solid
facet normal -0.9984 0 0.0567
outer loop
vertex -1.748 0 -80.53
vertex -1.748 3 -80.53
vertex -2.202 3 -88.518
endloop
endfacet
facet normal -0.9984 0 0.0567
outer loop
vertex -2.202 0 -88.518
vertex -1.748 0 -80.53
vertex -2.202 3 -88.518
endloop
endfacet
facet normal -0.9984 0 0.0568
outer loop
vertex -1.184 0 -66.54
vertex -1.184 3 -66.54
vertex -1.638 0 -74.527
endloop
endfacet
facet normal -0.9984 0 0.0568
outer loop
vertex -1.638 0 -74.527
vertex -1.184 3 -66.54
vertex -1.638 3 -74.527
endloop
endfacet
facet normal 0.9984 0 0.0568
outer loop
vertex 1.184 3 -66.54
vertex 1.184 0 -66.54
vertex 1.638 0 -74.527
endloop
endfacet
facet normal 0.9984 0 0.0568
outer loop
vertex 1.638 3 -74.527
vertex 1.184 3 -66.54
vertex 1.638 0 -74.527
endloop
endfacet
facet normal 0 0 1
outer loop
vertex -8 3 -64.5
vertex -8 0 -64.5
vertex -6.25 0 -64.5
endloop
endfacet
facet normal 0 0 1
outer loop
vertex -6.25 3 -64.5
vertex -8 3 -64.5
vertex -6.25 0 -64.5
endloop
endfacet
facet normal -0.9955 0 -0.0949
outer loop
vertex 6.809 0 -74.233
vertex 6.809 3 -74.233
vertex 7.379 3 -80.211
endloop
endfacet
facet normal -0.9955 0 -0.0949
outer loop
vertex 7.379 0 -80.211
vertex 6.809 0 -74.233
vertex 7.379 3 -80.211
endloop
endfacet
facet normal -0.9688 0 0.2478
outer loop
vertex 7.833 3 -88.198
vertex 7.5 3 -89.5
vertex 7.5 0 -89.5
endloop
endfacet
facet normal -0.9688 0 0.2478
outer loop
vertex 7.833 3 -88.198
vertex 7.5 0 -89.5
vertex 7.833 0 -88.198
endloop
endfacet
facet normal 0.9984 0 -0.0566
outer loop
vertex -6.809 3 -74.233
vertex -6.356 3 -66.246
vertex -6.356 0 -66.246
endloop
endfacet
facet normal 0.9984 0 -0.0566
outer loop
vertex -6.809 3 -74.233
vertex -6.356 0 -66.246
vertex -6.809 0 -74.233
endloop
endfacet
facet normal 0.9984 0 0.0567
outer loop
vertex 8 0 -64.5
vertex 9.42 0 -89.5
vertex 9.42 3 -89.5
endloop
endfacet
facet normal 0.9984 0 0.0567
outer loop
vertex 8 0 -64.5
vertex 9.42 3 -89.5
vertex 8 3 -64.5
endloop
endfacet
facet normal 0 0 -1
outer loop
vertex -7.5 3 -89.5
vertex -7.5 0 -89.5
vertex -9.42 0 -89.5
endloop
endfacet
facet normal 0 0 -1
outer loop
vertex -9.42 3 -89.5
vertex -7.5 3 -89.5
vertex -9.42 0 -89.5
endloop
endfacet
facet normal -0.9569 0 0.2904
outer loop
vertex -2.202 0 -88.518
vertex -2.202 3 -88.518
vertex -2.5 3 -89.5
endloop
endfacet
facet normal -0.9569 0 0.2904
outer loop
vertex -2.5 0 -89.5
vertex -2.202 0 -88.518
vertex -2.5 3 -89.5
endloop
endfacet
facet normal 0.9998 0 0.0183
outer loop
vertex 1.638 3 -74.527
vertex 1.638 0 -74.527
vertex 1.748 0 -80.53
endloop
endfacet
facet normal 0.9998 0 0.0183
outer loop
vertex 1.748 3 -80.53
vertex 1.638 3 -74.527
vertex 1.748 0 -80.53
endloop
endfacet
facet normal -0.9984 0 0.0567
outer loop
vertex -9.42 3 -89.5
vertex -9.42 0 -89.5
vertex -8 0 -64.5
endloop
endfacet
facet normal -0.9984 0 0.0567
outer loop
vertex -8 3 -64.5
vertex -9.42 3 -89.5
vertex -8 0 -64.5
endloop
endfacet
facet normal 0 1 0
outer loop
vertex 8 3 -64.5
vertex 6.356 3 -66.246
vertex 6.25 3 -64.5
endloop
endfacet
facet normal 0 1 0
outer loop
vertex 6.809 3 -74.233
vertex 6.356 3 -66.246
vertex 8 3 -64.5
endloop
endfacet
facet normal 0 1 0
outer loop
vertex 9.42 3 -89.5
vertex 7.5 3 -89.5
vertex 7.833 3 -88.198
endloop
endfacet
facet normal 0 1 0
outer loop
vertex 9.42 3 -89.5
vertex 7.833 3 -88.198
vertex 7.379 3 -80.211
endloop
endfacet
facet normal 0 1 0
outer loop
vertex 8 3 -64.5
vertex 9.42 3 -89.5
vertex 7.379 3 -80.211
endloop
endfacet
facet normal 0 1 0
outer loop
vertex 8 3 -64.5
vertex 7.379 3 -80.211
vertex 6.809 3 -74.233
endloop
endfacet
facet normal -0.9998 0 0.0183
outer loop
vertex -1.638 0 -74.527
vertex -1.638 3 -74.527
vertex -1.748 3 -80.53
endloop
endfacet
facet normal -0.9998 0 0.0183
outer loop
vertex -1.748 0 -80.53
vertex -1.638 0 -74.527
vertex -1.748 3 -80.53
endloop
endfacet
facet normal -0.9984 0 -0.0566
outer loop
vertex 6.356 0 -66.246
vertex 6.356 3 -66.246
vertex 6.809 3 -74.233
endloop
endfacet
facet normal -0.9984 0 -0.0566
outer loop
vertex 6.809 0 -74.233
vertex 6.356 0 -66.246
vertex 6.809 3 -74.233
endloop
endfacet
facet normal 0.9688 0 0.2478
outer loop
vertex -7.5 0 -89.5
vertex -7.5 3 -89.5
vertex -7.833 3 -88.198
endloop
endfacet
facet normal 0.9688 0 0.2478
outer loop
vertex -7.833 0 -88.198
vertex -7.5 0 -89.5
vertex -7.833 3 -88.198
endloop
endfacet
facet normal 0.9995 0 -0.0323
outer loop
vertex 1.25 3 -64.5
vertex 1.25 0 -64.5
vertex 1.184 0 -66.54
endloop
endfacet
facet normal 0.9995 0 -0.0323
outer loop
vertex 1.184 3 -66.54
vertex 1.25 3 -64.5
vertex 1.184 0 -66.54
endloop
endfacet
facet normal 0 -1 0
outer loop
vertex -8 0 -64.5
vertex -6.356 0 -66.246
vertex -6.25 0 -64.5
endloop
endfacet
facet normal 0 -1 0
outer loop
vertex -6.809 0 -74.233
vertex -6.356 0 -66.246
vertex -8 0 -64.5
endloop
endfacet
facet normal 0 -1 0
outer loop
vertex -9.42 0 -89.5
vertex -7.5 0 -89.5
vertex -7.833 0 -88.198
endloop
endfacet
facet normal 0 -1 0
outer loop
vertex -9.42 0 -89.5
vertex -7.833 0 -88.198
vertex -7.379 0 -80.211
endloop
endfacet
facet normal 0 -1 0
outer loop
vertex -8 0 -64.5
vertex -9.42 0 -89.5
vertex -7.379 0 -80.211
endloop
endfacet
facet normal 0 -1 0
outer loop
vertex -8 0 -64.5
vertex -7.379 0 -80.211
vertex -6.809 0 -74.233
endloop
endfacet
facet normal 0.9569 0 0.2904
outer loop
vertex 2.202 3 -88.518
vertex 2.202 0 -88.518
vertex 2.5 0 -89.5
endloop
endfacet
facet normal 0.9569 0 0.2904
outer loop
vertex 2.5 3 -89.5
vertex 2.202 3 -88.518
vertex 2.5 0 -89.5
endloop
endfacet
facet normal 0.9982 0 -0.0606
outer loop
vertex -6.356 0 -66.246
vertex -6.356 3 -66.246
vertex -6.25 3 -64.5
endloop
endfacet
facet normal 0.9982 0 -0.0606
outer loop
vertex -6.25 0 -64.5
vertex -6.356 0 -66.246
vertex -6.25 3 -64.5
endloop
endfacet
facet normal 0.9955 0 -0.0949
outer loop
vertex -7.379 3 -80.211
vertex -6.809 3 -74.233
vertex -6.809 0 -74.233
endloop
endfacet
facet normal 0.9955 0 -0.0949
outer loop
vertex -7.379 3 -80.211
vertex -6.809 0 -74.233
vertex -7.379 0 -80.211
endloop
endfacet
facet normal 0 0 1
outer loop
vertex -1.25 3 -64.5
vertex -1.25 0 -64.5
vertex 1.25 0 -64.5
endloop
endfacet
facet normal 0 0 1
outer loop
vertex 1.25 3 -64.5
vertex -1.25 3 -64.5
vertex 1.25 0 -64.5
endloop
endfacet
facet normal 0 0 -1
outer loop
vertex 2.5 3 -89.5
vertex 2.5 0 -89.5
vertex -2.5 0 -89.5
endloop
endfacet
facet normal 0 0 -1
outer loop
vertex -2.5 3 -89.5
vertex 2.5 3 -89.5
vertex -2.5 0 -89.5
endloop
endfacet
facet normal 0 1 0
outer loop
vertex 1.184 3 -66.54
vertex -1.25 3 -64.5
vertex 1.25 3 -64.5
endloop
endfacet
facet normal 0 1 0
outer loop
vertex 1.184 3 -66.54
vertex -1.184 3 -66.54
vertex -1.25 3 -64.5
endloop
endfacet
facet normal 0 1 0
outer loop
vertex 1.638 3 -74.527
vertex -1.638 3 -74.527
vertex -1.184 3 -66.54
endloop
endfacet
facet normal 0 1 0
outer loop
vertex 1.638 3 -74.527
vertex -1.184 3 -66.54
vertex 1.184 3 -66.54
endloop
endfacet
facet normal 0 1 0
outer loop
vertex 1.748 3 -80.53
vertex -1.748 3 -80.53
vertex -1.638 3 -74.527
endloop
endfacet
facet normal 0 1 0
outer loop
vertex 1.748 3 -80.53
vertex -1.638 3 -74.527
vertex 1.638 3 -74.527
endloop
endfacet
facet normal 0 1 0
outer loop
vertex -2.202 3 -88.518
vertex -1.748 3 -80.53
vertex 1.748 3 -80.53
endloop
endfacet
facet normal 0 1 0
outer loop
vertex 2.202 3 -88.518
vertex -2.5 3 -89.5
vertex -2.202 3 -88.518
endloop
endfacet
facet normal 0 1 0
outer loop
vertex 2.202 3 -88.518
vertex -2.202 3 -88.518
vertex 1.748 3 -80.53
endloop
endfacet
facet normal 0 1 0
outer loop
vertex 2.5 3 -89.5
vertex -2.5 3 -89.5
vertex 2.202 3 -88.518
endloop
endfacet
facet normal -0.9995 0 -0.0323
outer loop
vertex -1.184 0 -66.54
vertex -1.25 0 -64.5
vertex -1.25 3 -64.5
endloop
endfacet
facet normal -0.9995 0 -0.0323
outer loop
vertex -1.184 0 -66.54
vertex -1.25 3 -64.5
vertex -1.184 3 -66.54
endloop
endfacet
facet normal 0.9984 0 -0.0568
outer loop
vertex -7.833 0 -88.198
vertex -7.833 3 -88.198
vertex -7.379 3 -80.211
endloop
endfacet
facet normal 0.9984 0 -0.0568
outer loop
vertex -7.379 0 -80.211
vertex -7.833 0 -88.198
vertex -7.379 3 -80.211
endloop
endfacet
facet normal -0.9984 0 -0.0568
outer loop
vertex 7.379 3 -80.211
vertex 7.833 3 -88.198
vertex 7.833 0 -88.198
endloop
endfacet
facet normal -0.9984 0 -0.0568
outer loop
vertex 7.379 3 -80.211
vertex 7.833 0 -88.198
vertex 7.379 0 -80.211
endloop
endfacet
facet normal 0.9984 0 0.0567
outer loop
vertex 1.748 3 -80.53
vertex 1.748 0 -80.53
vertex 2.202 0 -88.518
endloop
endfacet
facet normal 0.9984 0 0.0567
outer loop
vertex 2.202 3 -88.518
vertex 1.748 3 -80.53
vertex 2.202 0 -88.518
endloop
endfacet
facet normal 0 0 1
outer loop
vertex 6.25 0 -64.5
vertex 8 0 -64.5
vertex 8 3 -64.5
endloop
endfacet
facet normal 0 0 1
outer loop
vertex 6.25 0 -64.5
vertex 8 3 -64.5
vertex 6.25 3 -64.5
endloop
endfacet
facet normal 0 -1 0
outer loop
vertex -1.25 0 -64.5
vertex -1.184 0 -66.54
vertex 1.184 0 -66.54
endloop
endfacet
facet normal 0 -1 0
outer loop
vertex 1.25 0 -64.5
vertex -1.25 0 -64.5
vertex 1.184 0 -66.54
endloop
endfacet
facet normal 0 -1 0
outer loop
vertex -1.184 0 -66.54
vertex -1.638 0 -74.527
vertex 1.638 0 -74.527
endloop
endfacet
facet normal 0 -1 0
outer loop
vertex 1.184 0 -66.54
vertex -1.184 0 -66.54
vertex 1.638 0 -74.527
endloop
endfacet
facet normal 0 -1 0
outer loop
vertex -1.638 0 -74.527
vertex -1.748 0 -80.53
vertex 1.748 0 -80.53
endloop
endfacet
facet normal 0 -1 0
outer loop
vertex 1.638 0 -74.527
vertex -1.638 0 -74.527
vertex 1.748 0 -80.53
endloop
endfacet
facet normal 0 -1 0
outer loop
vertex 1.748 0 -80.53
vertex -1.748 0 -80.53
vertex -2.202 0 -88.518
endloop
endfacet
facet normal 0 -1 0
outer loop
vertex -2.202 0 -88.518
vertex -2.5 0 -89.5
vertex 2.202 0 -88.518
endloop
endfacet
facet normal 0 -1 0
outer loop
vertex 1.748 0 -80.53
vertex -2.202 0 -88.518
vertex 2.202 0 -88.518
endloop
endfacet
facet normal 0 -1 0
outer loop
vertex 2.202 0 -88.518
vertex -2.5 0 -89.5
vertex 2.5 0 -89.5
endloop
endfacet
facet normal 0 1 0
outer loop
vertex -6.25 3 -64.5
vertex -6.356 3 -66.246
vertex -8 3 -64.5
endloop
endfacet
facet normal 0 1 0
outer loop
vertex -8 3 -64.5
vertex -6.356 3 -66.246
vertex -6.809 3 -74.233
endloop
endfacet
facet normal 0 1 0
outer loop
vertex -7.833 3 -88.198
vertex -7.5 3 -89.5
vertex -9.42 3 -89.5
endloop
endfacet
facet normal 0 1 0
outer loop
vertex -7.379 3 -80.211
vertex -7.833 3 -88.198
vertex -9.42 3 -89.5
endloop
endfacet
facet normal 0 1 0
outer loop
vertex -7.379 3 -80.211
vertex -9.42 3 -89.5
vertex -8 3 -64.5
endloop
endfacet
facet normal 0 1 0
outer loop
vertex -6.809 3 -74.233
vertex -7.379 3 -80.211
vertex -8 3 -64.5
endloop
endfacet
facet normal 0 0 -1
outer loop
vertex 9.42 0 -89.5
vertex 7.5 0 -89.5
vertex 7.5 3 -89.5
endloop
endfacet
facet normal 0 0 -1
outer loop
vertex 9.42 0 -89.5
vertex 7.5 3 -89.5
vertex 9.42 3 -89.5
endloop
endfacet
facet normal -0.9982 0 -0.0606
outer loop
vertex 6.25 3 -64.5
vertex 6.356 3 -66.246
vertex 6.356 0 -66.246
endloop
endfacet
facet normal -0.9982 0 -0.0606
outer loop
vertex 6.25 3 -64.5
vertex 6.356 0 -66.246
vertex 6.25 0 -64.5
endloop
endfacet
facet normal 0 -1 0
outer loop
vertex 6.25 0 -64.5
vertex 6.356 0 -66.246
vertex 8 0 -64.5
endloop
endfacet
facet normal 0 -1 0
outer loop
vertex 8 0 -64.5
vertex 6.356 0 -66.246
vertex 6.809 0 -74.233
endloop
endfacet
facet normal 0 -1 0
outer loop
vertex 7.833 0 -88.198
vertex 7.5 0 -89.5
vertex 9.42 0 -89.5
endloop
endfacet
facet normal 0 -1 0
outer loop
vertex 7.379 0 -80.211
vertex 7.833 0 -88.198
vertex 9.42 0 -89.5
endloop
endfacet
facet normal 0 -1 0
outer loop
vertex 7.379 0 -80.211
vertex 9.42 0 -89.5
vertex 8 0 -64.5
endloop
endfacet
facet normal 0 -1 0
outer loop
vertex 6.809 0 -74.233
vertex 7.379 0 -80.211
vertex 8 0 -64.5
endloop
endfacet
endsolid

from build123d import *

# Parameters (mm, degrees)
BOSS_EXTRUDE1_DEPTH = 3
CUT_EXTRUDE1_DEPTH  = 91.044316414
BOSS_EXTRUDE2_DEPTH = 3
CUT_EXTRUDE7_DEPTH  = 91.044316414
CUT_EXTRUDE9_DEPTH  = 91.044316414
MIRROR10_DEPTH      = 3


# Read off the part's stored shape, not the designer's step: Mirror10
with BuildPart() as part:
    # Sketch1 → Boss-Extrude1 (new body)
    with BuildSketch(Plane(origin=(0, 0, 0), x_dir=(1, 0, 0), z_dir=(0, 1, 0))):
        Polygon((-9.419602878, 89.5), (-8, 64.5), (0, 64.5), (0, 89.5), align=None)
    extrude(amount=BOSS_EXTRUDE1_DEPTH)

    # Sketch2 → Cut-Extrude1 (cut, symmetric)
    with BuildSketch(Plane(origin=(0, 3, 0), x_dir=(1, 0, 0), z_dir=(0, 1, 0))):
        Polygon((-6.585534884, 66.233172431), (-0.954605862, 66.552919753), (-2.201847188, 88.517536505), (-7.83277621, 88.197789183), align=None)
    extrude(amount=CUT_EXTRUDE1_DEPTH, both=True, mode=Mode.SUBTRACT)

    # Sketch6 → Boss-Extrude2 (add)
    with BuildSketch(Plane(origin=(0, 3, 0), x_dir=(1, 0, 0), z_dir=(0, 1, 0))):
        Polygon((-6.585534884, 66.233172431), (-6.3559048, 66.246211772), (-6.8094471, 74.233345137), (-7.37923391, 80.210655819), align=None)
    boss_extrude2 = extrude(amount=-BOSS_EXTRUDE2_DEPTH)

    # Mirror3: Boss-Extrude2 across plane
    add(boss_extrude2.mirror(Plane(origin=(0, 0, 0), x_dir=(0.05669278756337804, 0, 0.9983916705573488), z_dir=(0.9983916705573489, 0, -0.05669278756337803))))

    # Sketch7 → Cut-Extrude7 (cut, symmetric)
    with BuildSketch(Plane(origin=(0, 3, 0), x_dir=(1, 0, 0), z_dir=(0, 1, 0))):
        Polygon((-7.5, 89.5), (-7.83277621, 88.197789183), (-2.201847188, 88.517536505), (-2.5, 89.5), align=None)
    extrude(amount=CUT_EXTRUDE7_DEPTH, both=True, mode=Mode.SUBTRACT)

    # Sketch14 → Cut-Extrude9 (cut, symmetric)
    with BuildSketch(Plane(origin=(0, 3, 0), x_dir=(1, 0, 0), z_dir=(0, 1, 0))):
        Polygon((-6.3559048, 66.246211772), (-6.25, 64.5), (-1.25, 64.5), (-1.184235946, 66.539880412), align=None)
    extrude(amount=CUT_EXTRUDE9_DEPTH, both=True, mode=Mode.SUBTRACT)


with BuildPart() as cut_extrude9_piece_1:
    # of the separate pieces the step leaves, piece 1, a body of its own (cut_extrude9_pieces)
    add(part.part.solids().sort_by_distance((-1.25, 0, -64.5))[0])

    # Mirror10 outline → Mirror10 (add)
    with BuildSketch(Plane(origin=(0, 0, 0), x_dir=(1, 0, 0), z_dir=(0, 1, 0))):
        Polygon((0, 64.5), (1.25, 64.5), (1.184235946, 66.539880412), (1.637778247, 74.527013776), (1.748304888, 80.530403141), (2.201847188, 88.517536505), (2.5, 89.5), (0, 89.5), align=None)
    extrude(amount=MIRROR10_DEPTH)


with BuildPart() as cut_extrude9_piece_2:
    # of the separate pieces the step leaves, piece 2, a body of its own (cut_extrude9_pieces)
    add(part.part.solids().sort_by_distance((-9.419602878, 0, -89.5))[0])


with BuildPart() as body_3:
    # Mirror12: mirrored copy
    add(cut_extrude9_piece_2.part.mirror(Plane(origin=(0, 0, 0), x_dir=(0, 0, 1), z_dir=(1, 0, 0))))


solid = Compound([cut_extrude9_piece_1.part, cut_extrude9_piece_2.part, body_3.part])
